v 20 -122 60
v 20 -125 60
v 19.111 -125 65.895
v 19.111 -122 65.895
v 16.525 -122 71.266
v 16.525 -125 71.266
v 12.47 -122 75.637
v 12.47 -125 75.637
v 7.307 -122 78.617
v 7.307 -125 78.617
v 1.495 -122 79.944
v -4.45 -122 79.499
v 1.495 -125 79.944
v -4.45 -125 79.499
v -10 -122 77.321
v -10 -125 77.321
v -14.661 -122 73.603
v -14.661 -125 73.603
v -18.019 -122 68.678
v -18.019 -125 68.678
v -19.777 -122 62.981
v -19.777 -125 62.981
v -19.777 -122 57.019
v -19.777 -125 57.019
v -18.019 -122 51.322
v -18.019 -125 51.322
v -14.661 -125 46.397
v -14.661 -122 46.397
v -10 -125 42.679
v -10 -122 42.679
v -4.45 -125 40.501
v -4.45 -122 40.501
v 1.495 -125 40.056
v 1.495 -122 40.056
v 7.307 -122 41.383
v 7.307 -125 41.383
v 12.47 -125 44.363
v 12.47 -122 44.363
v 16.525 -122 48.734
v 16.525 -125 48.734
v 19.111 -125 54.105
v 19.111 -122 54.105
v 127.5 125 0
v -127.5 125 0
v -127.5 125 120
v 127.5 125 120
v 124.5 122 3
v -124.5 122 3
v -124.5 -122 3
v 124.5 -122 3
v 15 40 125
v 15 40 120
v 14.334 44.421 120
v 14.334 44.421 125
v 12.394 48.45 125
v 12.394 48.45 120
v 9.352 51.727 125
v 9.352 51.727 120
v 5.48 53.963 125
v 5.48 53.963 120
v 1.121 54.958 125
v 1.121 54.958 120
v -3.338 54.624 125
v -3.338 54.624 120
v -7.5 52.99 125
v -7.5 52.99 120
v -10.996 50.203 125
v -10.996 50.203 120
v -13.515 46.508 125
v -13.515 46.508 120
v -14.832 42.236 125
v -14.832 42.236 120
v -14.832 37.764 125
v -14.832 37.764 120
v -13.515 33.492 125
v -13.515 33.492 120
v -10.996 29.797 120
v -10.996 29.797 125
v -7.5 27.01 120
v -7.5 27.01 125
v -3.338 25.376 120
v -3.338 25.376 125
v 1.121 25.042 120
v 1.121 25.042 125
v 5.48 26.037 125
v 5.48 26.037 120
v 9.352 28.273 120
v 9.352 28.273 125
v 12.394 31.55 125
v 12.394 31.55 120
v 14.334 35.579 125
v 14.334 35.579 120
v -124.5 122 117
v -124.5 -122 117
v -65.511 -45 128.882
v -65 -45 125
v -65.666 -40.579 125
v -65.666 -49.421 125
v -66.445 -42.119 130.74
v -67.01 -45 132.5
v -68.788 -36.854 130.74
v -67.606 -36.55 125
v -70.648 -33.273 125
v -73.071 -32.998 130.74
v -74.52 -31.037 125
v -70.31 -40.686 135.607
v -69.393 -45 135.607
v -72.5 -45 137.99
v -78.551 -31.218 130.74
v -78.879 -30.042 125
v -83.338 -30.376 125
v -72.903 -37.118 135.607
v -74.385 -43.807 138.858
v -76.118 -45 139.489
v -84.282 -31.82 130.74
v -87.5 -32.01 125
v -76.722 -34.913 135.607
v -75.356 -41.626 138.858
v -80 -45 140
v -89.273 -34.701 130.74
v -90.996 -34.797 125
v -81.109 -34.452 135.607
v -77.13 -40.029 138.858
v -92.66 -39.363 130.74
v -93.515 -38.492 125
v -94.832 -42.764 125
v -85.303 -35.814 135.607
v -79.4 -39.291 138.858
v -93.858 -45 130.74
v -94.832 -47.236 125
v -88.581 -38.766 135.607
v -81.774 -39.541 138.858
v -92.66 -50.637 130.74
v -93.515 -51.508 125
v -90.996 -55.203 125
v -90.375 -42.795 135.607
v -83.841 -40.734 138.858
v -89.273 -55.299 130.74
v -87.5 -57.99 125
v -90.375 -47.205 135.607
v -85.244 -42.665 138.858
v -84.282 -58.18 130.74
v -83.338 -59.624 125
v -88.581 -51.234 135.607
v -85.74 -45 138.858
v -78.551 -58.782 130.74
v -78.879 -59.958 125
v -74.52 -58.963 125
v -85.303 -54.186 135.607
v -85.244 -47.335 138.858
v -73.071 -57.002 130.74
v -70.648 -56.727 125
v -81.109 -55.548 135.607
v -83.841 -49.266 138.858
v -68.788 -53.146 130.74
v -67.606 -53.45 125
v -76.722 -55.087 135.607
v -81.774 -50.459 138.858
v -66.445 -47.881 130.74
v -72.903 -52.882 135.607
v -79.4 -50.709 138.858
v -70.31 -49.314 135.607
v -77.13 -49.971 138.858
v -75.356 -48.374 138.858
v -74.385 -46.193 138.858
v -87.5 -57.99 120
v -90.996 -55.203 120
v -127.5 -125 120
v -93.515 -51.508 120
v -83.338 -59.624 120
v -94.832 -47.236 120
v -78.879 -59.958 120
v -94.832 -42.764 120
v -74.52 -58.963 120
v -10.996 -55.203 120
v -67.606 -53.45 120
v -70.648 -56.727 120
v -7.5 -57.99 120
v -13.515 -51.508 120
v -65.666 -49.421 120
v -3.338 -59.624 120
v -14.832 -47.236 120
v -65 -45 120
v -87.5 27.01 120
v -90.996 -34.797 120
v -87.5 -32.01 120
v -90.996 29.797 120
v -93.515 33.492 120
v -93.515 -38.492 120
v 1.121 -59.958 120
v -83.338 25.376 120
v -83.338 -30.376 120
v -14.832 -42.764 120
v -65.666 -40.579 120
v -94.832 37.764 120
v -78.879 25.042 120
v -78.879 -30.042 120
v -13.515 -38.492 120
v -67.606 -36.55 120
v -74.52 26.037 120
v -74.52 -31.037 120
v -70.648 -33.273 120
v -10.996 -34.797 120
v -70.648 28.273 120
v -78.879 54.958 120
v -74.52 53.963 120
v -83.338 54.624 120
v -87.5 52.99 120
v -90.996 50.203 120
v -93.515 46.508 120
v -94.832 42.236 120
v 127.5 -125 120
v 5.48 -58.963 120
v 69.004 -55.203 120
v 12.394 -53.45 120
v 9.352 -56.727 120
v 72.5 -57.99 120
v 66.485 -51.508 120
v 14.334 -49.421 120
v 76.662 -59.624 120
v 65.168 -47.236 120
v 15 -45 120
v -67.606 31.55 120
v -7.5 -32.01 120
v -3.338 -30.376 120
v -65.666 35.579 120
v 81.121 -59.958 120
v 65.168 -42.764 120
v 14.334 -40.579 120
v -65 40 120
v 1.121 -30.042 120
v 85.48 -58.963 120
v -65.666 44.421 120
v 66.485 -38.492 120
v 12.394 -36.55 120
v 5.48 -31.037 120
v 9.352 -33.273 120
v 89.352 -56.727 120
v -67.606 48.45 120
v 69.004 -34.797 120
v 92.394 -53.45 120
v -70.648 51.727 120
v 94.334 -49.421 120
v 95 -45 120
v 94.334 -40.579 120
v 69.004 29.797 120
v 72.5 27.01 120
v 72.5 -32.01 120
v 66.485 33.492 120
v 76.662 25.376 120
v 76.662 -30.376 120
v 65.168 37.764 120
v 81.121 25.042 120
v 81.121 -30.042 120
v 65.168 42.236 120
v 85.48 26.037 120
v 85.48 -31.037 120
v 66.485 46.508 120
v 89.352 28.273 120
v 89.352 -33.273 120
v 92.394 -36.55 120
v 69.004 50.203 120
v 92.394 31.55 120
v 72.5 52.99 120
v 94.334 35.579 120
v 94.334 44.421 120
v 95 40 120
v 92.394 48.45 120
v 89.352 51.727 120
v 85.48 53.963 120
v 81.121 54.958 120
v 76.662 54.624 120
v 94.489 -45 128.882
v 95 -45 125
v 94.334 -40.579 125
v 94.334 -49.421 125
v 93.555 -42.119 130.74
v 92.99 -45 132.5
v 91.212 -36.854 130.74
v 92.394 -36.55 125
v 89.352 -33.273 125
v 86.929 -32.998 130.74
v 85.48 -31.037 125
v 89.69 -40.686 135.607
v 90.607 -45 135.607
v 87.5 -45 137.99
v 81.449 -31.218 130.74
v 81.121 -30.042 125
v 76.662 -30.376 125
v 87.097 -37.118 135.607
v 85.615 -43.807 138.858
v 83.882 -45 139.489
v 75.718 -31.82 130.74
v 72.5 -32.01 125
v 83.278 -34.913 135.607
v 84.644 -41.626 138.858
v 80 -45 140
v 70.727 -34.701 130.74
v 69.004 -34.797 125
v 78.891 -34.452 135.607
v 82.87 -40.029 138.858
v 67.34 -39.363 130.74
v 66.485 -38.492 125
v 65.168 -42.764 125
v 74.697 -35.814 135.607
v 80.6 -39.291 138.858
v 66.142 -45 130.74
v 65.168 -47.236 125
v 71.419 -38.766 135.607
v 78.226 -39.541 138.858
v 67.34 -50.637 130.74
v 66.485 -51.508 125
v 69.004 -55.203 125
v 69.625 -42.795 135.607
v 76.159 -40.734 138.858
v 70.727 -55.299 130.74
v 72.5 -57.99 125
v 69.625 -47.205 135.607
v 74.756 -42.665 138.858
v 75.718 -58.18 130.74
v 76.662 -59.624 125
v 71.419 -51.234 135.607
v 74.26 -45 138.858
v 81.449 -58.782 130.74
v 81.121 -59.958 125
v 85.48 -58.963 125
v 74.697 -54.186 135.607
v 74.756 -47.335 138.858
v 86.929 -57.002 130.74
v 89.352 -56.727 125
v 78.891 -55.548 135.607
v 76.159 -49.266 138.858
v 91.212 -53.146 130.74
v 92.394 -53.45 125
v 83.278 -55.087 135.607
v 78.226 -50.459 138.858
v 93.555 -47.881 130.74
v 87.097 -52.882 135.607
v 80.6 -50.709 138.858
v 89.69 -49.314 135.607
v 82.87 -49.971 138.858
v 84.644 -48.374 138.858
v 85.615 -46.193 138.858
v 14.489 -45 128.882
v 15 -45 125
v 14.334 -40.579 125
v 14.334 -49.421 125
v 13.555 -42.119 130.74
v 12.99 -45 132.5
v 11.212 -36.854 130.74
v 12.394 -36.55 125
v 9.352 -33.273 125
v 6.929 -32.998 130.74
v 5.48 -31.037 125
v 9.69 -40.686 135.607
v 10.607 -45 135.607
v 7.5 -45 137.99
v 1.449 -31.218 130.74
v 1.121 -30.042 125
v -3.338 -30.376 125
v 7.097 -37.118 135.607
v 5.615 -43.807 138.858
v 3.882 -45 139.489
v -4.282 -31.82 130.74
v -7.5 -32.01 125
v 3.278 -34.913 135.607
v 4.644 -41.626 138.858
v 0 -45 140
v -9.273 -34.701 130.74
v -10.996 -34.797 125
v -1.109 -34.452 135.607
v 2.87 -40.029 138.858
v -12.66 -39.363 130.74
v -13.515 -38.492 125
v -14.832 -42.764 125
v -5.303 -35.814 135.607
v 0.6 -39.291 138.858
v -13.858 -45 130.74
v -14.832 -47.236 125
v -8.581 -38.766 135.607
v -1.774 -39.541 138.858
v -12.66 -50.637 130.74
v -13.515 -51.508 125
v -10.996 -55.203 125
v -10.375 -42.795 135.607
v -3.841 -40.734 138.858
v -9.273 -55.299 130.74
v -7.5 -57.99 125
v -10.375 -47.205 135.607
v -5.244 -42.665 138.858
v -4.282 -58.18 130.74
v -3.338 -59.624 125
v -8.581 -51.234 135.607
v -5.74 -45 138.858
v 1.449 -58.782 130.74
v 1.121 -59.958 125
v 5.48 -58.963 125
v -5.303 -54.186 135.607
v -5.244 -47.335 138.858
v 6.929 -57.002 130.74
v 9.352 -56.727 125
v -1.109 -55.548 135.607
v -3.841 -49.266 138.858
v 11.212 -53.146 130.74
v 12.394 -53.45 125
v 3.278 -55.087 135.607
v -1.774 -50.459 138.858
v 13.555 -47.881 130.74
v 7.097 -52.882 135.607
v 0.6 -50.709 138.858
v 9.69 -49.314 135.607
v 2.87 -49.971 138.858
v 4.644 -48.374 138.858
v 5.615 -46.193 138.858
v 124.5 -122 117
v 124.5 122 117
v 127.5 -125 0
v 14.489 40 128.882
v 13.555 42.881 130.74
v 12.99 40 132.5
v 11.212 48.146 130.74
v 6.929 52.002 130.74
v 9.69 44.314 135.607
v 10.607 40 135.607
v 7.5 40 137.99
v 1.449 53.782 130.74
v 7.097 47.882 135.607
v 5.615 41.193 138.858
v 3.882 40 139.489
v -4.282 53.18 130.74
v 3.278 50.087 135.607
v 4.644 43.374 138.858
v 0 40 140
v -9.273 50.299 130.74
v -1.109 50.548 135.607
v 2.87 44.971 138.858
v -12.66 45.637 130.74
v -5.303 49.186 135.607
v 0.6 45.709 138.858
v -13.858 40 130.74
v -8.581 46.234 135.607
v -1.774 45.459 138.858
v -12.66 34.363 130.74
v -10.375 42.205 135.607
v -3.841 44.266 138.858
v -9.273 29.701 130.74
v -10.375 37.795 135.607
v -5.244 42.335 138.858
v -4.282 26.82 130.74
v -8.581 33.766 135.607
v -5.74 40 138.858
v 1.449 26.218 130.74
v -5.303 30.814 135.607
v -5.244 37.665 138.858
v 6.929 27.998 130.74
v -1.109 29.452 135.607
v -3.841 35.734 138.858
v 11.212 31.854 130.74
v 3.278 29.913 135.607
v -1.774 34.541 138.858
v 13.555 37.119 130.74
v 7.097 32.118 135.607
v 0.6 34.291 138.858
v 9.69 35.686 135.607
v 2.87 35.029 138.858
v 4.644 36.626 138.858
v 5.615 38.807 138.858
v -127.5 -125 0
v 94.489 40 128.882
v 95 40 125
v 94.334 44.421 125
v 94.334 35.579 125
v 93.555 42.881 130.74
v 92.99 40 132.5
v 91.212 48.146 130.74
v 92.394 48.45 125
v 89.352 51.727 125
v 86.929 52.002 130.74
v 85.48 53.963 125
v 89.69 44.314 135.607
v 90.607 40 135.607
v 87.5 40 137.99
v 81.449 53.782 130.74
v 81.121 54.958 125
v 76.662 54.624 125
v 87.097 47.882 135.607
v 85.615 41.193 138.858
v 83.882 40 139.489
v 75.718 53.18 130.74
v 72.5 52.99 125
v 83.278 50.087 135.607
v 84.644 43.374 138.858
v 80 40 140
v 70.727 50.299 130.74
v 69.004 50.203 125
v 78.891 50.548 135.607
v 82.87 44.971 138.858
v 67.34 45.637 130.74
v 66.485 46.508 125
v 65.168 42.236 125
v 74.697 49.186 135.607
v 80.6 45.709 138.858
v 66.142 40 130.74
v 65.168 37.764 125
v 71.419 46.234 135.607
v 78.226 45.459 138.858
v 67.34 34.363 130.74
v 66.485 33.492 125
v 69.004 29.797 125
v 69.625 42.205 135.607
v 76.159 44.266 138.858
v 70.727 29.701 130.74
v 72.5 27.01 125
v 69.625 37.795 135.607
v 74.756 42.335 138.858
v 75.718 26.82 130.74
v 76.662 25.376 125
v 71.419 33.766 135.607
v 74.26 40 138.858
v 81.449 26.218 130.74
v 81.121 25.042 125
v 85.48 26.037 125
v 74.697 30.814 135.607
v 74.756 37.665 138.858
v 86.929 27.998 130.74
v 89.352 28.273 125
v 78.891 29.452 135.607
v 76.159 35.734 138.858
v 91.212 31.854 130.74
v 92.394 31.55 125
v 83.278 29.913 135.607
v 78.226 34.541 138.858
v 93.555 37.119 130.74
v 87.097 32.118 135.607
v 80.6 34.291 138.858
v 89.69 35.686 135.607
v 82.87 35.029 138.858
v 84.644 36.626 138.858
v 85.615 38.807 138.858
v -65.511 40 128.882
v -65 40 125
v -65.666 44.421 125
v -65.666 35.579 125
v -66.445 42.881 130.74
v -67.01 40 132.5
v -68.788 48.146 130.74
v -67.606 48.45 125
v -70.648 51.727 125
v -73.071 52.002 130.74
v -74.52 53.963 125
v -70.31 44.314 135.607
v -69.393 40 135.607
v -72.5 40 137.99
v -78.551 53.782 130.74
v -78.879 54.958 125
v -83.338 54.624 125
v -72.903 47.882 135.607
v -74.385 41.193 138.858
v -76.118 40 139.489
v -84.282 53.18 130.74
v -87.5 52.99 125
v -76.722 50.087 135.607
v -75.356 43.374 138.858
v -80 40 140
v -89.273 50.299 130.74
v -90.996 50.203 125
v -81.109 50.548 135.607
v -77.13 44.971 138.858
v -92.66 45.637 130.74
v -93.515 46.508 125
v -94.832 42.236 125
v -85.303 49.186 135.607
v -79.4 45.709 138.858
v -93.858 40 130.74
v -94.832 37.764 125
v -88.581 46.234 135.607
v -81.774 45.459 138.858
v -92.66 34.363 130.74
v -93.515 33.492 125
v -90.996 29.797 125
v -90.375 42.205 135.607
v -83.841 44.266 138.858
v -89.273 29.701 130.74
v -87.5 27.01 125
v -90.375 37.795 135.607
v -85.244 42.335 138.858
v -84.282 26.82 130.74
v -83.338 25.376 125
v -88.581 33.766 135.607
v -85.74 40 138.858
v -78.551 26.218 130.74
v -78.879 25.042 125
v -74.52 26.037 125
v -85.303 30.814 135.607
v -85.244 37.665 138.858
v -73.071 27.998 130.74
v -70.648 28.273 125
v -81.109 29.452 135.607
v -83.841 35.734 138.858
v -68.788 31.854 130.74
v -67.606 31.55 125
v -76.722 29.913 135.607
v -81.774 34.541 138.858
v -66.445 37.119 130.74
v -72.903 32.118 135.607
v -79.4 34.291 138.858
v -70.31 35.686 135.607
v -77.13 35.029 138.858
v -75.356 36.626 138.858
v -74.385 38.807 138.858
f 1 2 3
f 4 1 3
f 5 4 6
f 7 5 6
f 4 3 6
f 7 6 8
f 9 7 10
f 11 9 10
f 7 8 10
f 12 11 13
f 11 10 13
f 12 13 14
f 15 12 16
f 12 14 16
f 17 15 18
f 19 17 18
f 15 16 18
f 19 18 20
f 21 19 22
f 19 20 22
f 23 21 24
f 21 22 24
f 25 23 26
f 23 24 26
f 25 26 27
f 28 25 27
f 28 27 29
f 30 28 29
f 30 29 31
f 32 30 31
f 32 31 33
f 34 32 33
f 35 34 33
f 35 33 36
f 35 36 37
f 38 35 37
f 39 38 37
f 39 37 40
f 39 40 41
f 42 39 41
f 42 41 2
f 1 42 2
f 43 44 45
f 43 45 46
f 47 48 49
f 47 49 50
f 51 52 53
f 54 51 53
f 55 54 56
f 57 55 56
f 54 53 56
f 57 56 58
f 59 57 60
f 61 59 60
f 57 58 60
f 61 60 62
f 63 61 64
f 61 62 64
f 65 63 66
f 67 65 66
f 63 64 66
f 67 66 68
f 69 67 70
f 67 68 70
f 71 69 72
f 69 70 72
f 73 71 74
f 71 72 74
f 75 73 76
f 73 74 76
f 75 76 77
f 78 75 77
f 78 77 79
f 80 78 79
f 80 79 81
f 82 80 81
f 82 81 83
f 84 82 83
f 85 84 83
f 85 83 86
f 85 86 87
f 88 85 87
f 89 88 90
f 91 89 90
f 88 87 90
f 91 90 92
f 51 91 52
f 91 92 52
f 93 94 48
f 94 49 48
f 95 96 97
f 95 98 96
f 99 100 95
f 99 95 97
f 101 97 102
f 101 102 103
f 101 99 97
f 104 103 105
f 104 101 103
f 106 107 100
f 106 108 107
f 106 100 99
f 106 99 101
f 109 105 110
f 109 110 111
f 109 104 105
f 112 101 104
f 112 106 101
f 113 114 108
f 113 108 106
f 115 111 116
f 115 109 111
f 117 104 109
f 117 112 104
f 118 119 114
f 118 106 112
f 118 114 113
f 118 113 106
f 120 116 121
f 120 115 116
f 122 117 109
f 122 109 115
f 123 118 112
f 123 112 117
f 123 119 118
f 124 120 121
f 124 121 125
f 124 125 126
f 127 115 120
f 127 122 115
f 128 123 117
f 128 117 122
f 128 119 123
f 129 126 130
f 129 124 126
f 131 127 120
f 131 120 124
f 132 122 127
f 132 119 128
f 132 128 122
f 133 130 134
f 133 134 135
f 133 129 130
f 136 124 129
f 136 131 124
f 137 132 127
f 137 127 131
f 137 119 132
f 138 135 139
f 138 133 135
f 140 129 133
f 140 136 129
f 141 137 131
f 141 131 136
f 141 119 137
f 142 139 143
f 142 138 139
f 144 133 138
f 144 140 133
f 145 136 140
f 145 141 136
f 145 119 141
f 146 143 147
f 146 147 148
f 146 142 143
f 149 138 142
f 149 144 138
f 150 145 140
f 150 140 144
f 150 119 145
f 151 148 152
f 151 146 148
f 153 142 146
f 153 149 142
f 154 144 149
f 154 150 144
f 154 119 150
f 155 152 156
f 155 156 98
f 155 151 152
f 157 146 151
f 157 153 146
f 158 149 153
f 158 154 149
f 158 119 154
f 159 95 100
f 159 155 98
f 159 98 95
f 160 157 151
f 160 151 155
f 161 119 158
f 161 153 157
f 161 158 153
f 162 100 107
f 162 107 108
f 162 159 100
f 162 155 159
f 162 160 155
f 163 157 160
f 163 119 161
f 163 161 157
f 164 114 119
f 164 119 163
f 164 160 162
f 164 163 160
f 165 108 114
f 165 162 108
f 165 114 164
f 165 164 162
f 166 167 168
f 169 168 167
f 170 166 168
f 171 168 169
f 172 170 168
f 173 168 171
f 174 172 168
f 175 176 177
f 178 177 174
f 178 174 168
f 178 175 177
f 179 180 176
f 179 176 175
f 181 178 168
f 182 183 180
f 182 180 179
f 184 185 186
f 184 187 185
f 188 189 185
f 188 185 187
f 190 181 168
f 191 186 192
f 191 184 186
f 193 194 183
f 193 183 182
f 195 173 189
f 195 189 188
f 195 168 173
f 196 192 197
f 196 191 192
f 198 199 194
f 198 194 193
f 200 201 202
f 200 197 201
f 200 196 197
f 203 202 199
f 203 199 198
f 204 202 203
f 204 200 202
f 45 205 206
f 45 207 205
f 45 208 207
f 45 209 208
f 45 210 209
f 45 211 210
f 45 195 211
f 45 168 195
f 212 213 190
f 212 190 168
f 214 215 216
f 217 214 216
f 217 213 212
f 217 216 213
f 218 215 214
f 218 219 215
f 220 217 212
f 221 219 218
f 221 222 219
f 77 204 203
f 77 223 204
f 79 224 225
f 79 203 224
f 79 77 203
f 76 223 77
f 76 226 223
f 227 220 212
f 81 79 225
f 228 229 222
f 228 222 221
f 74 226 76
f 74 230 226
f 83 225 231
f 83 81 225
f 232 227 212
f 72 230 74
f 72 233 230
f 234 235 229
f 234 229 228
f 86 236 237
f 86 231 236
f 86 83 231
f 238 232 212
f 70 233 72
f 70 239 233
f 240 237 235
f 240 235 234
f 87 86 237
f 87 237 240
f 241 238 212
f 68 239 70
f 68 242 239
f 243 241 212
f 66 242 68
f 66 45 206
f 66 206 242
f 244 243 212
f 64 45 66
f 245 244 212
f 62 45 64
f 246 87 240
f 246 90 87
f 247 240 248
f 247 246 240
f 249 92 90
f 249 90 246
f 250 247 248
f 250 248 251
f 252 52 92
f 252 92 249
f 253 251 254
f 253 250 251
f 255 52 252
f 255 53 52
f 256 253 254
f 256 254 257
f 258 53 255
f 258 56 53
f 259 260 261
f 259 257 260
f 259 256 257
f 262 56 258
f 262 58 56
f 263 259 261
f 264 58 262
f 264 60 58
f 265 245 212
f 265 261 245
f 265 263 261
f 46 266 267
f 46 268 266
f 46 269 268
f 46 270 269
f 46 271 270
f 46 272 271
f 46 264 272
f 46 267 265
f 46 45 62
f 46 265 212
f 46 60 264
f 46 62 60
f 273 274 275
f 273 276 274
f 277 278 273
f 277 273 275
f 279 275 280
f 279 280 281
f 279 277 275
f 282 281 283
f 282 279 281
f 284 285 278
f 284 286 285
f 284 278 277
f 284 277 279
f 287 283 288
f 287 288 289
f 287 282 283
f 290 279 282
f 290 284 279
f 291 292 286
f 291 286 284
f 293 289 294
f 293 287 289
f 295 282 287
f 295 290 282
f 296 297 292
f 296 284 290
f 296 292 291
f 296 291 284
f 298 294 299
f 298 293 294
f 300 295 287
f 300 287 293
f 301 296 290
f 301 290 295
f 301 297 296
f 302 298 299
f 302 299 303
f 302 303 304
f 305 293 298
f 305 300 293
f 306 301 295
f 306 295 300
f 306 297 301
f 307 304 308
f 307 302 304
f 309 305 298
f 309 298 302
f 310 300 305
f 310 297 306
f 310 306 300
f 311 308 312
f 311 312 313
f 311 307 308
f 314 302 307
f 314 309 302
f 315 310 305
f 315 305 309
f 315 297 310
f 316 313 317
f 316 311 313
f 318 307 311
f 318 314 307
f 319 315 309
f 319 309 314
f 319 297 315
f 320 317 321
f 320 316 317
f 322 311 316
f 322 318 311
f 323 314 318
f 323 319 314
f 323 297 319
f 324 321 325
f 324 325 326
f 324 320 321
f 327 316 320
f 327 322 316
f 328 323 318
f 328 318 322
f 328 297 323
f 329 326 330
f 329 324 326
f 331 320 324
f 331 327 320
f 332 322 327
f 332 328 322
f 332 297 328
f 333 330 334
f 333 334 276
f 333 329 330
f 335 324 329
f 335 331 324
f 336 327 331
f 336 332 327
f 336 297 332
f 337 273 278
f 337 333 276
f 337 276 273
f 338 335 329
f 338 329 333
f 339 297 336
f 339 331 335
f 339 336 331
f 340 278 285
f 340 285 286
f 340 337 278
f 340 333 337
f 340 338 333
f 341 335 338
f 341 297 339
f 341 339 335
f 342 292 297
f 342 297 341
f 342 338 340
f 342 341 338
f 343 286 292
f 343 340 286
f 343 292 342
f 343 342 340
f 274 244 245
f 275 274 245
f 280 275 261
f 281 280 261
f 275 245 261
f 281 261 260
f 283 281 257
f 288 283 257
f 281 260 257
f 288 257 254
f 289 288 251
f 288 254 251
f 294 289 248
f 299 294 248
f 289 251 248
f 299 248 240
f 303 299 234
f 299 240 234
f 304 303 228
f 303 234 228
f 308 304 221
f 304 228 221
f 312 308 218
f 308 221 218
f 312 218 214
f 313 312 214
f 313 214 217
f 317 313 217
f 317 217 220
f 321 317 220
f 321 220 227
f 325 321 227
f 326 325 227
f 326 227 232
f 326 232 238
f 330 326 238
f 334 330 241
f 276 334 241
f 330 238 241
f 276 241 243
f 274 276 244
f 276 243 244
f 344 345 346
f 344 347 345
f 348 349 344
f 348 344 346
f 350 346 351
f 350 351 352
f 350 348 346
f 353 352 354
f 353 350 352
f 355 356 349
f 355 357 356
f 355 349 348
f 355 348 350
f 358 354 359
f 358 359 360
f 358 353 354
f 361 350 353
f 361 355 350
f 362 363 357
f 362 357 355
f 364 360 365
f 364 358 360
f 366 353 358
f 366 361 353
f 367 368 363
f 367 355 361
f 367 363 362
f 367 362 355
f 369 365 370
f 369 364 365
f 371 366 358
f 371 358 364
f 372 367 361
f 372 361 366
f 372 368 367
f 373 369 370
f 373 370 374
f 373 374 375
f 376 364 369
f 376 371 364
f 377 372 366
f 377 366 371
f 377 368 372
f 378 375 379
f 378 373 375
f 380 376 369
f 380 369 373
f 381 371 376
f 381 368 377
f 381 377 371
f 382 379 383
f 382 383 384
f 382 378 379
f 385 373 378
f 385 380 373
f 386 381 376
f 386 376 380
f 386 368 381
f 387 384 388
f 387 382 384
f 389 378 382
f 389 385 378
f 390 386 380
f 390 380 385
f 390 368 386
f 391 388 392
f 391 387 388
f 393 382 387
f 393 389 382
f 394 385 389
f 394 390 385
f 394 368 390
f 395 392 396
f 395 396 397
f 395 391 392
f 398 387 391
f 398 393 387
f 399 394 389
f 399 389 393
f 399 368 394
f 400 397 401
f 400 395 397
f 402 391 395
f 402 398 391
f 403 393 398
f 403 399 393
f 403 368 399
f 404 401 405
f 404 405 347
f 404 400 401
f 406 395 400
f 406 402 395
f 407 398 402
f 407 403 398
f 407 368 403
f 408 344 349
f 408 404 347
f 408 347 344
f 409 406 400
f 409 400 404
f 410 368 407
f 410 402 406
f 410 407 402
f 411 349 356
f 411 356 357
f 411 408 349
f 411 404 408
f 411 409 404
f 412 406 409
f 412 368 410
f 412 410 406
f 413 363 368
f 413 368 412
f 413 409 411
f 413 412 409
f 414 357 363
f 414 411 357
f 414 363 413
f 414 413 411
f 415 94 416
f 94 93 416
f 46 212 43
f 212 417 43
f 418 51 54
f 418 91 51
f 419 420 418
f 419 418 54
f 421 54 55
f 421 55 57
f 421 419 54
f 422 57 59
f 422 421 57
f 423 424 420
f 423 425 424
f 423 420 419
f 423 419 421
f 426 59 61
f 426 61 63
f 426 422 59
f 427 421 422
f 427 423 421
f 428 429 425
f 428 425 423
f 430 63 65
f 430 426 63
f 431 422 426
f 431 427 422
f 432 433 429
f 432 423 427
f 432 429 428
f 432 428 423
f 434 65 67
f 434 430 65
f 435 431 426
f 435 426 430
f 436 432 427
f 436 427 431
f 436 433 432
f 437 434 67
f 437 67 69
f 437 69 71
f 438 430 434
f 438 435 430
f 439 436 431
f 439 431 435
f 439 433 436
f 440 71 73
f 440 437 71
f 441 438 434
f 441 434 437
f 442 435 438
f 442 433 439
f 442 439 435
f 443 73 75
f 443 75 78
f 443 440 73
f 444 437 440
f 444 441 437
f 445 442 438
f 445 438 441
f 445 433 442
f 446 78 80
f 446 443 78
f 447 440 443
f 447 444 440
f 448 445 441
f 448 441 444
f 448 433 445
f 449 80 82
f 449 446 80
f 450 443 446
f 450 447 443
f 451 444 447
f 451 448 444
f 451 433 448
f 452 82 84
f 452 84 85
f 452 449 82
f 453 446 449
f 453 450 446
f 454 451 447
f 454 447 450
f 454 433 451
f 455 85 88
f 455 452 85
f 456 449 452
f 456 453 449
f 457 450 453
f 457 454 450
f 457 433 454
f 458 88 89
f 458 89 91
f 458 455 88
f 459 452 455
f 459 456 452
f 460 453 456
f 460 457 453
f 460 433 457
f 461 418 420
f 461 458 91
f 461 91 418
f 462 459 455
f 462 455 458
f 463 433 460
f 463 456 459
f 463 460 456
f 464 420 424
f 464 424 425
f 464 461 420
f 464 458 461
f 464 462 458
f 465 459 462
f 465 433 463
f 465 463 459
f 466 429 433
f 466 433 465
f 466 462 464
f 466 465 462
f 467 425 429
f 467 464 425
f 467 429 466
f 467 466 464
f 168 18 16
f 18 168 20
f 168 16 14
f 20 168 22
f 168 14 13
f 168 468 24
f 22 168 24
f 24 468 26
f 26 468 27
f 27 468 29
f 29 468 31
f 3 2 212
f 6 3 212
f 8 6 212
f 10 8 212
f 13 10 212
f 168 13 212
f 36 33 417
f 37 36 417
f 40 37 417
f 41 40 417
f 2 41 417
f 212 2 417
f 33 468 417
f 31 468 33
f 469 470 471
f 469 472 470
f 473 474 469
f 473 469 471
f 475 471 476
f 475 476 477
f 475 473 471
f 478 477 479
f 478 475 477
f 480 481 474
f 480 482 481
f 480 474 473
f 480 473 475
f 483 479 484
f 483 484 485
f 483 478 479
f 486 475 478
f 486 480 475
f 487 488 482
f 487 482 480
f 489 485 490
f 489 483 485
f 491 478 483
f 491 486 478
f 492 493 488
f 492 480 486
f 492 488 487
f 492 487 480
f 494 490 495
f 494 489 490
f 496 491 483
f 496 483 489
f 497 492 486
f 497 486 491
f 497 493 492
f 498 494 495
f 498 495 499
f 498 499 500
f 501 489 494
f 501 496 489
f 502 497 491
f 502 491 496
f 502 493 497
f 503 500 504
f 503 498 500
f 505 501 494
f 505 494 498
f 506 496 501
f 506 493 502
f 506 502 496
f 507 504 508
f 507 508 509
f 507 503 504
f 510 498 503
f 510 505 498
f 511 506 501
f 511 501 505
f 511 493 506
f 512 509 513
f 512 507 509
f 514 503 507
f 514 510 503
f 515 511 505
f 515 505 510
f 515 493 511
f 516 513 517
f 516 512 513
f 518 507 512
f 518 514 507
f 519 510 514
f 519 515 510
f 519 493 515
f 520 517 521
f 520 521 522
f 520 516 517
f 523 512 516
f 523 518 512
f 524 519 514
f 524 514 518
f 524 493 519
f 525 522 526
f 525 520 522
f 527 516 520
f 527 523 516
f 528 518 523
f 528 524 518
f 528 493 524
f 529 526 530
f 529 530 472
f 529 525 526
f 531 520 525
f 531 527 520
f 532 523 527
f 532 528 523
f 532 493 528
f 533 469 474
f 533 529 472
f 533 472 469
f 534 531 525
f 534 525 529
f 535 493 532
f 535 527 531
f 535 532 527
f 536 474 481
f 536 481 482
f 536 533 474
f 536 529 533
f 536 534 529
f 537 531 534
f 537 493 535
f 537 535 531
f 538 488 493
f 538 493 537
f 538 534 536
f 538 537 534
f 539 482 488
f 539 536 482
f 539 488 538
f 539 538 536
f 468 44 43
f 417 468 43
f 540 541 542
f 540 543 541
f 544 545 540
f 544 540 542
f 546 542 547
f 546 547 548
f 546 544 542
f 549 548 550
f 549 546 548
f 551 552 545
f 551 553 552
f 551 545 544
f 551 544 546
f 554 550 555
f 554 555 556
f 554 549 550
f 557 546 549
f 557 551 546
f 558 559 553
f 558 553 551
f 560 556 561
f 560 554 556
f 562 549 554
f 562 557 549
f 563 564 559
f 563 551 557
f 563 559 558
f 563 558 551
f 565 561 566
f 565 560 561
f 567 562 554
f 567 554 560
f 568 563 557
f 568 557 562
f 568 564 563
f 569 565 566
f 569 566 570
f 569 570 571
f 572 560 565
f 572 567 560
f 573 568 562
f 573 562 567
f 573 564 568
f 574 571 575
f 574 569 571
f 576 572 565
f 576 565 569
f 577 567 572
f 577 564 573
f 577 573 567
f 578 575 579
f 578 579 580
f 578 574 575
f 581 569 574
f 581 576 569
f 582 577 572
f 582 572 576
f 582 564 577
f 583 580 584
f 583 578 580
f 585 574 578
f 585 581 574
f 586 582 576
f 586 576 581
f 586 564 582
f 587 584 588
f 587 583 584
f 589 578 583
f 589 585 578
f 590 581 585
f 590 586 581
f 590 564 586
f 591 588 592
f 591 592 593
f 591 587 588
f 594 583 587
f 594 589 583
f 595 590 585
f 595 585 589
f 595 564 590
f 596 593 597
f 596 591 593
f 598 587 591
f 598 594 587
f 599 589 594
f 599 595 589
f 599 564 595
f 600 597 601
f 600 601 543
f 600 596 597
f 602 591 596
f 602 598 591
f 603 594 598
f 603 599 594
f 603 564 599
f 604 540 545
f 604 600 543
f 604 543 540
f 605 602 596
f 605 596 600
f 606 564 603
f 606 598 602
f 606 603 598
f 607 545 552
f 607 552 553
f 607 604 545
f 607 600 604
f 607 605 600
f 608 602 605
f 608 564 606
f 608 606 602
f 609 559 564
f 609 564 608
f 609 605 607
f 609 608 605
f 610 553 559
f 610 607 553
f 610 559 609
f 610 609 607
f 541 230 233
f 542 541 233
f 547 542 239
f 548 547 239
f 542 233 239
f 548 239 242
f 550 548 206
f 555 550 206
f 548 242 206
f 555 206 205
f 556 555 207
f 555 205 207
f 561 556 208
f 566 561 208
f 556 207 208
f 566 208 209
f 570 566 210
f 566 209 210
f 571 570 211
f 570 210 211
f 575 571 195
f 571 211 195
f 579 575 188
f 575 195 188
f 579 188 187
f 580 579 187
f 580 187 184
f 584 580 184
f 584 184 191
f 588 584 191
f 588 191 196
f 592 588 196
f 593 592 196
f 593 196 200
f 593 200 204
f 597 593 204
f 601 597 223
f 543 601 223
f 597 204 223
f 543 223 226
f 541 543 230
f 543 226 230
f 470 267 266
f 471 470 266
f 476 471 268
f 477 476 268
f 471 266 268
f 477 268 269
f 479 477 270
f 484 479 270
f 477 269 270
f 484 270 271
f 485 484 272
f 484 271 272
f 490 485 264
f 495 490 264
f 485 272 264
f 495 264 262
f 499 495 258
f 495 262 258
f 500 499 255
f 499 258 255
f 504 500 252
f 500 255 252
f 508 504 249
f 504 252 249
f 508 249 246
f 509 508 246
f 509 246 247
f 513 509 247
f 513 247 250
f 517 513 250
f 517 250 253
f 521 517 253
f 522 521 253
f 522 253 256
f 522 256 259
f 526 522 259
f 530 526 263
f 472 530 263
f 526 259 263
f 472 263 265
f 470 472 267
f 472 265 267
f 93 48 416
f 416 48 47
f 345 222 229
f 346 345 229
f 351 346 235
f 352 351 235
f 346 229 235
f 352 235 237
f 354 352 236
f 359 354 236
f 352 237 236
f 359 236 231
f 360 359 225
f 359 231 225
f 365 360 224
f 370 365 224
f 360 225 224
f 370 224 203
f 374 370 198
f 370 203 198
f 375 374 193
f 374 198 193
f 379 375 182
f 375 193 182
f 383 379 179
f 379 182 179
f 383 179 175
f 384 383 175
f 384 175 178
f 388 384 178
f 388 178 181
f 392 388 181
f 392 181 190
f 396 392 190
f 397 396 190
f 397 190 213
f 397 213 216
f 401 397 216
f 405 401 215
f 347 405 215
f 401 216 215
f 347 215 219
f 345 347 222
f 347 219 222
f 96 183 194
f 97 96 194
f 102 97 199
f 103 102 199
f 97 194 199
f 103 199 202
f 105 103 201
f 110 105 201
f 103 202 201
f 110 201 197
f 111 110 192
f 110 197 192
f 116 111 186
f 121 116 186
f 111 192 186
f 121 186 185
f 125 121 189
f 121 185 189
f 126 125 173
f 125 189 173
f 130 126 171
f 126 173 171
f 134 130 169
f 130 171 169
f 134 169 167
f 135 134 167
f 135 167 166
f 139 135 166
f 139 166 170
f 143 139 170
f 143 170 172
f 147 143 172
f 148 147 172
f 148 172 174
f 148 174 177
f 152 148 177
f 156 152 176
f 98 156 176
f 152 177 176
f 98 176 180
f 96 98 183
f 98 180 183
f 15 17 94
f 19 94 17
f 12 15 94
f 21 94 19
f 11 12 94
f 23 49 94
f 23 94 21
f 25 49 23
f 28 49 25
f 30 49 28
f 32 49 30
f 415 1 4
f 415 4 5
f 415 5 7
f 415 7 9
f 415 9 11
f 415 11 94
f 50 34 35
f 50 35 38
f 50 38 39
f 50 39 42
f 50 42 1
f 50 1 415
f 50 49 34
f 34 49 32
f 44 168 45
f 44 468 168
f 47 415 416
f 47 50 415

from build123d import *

# Parameters (mm, degrees)
F0_W     = 255
F0_H     = 250
F1_DEPTH = 117
F2_T     = -3
F3_W     = 255
F3_H     = 250
F4_DEPTH = 3
F5_R     = 20
F6_DEPTH = 25
F7_R     = 15
F8_DEPTH = 20
F9_R     = 15


with BuildPart() as f1:
    # F0 (on Top) → F1 (new body)
    with BuildSketch(Plane.XY):
        Rectangle(F0_W, F0_H)
    extrude(amount=F1_DEPTH)

    # F2
    f2_openings = [f1.faces().sort_by_distance(p)[0] for p in [
        (0, 0, 117),
    ]]
    offset(amount=F2_T, openings=f2_openings)

    # F3 (on face) → F4 (join)
    with BuildSketch(Plane.XY.offset(117)):
        Rectangle(F3_W, F3_H)
    extrude(amount=F4_DEPTH)

    # F5 (on face) → F6 (cut)
    with BuildSketch(Plane.XZ.offset(125)):
        with Locations((0, 60)):
            Circle(F5_R)
    extrude(amount=-F6_DEPTH, mode=Mode.SUBTRACT)

    # F7 (on face) → F8 (join)
    with BuildSketch(Plane.XY.offset(120)):
        with Locations((-80, 40)):
            Circle(F7_R)
        with Locations((0, 40)):
            Circle(F7_R)
        with Locations((80, 40)):
            Circle(F7_R)
        with Locations((-80, -45)):
            Circle(F7_R)
        with Locations((0, -45)):
            Circle(F7_R)
        with Locations((80, -45)):
            Circle(F7_R)
    extrude(amount=F8_DEPTH)

    # F9
    f9_edges = [f1.edges().sort_by_distance(p)[0] for p in [
        (-15, 40, 140),
        (-95, 40, 140),
        (65, 40, 140),
        (65, -45, 140),
        (-15, -45, 140),
        (-95, -45, 140),
    ]]
    fillet(f9_edges, radius=F9_R)


solid = f1.part
